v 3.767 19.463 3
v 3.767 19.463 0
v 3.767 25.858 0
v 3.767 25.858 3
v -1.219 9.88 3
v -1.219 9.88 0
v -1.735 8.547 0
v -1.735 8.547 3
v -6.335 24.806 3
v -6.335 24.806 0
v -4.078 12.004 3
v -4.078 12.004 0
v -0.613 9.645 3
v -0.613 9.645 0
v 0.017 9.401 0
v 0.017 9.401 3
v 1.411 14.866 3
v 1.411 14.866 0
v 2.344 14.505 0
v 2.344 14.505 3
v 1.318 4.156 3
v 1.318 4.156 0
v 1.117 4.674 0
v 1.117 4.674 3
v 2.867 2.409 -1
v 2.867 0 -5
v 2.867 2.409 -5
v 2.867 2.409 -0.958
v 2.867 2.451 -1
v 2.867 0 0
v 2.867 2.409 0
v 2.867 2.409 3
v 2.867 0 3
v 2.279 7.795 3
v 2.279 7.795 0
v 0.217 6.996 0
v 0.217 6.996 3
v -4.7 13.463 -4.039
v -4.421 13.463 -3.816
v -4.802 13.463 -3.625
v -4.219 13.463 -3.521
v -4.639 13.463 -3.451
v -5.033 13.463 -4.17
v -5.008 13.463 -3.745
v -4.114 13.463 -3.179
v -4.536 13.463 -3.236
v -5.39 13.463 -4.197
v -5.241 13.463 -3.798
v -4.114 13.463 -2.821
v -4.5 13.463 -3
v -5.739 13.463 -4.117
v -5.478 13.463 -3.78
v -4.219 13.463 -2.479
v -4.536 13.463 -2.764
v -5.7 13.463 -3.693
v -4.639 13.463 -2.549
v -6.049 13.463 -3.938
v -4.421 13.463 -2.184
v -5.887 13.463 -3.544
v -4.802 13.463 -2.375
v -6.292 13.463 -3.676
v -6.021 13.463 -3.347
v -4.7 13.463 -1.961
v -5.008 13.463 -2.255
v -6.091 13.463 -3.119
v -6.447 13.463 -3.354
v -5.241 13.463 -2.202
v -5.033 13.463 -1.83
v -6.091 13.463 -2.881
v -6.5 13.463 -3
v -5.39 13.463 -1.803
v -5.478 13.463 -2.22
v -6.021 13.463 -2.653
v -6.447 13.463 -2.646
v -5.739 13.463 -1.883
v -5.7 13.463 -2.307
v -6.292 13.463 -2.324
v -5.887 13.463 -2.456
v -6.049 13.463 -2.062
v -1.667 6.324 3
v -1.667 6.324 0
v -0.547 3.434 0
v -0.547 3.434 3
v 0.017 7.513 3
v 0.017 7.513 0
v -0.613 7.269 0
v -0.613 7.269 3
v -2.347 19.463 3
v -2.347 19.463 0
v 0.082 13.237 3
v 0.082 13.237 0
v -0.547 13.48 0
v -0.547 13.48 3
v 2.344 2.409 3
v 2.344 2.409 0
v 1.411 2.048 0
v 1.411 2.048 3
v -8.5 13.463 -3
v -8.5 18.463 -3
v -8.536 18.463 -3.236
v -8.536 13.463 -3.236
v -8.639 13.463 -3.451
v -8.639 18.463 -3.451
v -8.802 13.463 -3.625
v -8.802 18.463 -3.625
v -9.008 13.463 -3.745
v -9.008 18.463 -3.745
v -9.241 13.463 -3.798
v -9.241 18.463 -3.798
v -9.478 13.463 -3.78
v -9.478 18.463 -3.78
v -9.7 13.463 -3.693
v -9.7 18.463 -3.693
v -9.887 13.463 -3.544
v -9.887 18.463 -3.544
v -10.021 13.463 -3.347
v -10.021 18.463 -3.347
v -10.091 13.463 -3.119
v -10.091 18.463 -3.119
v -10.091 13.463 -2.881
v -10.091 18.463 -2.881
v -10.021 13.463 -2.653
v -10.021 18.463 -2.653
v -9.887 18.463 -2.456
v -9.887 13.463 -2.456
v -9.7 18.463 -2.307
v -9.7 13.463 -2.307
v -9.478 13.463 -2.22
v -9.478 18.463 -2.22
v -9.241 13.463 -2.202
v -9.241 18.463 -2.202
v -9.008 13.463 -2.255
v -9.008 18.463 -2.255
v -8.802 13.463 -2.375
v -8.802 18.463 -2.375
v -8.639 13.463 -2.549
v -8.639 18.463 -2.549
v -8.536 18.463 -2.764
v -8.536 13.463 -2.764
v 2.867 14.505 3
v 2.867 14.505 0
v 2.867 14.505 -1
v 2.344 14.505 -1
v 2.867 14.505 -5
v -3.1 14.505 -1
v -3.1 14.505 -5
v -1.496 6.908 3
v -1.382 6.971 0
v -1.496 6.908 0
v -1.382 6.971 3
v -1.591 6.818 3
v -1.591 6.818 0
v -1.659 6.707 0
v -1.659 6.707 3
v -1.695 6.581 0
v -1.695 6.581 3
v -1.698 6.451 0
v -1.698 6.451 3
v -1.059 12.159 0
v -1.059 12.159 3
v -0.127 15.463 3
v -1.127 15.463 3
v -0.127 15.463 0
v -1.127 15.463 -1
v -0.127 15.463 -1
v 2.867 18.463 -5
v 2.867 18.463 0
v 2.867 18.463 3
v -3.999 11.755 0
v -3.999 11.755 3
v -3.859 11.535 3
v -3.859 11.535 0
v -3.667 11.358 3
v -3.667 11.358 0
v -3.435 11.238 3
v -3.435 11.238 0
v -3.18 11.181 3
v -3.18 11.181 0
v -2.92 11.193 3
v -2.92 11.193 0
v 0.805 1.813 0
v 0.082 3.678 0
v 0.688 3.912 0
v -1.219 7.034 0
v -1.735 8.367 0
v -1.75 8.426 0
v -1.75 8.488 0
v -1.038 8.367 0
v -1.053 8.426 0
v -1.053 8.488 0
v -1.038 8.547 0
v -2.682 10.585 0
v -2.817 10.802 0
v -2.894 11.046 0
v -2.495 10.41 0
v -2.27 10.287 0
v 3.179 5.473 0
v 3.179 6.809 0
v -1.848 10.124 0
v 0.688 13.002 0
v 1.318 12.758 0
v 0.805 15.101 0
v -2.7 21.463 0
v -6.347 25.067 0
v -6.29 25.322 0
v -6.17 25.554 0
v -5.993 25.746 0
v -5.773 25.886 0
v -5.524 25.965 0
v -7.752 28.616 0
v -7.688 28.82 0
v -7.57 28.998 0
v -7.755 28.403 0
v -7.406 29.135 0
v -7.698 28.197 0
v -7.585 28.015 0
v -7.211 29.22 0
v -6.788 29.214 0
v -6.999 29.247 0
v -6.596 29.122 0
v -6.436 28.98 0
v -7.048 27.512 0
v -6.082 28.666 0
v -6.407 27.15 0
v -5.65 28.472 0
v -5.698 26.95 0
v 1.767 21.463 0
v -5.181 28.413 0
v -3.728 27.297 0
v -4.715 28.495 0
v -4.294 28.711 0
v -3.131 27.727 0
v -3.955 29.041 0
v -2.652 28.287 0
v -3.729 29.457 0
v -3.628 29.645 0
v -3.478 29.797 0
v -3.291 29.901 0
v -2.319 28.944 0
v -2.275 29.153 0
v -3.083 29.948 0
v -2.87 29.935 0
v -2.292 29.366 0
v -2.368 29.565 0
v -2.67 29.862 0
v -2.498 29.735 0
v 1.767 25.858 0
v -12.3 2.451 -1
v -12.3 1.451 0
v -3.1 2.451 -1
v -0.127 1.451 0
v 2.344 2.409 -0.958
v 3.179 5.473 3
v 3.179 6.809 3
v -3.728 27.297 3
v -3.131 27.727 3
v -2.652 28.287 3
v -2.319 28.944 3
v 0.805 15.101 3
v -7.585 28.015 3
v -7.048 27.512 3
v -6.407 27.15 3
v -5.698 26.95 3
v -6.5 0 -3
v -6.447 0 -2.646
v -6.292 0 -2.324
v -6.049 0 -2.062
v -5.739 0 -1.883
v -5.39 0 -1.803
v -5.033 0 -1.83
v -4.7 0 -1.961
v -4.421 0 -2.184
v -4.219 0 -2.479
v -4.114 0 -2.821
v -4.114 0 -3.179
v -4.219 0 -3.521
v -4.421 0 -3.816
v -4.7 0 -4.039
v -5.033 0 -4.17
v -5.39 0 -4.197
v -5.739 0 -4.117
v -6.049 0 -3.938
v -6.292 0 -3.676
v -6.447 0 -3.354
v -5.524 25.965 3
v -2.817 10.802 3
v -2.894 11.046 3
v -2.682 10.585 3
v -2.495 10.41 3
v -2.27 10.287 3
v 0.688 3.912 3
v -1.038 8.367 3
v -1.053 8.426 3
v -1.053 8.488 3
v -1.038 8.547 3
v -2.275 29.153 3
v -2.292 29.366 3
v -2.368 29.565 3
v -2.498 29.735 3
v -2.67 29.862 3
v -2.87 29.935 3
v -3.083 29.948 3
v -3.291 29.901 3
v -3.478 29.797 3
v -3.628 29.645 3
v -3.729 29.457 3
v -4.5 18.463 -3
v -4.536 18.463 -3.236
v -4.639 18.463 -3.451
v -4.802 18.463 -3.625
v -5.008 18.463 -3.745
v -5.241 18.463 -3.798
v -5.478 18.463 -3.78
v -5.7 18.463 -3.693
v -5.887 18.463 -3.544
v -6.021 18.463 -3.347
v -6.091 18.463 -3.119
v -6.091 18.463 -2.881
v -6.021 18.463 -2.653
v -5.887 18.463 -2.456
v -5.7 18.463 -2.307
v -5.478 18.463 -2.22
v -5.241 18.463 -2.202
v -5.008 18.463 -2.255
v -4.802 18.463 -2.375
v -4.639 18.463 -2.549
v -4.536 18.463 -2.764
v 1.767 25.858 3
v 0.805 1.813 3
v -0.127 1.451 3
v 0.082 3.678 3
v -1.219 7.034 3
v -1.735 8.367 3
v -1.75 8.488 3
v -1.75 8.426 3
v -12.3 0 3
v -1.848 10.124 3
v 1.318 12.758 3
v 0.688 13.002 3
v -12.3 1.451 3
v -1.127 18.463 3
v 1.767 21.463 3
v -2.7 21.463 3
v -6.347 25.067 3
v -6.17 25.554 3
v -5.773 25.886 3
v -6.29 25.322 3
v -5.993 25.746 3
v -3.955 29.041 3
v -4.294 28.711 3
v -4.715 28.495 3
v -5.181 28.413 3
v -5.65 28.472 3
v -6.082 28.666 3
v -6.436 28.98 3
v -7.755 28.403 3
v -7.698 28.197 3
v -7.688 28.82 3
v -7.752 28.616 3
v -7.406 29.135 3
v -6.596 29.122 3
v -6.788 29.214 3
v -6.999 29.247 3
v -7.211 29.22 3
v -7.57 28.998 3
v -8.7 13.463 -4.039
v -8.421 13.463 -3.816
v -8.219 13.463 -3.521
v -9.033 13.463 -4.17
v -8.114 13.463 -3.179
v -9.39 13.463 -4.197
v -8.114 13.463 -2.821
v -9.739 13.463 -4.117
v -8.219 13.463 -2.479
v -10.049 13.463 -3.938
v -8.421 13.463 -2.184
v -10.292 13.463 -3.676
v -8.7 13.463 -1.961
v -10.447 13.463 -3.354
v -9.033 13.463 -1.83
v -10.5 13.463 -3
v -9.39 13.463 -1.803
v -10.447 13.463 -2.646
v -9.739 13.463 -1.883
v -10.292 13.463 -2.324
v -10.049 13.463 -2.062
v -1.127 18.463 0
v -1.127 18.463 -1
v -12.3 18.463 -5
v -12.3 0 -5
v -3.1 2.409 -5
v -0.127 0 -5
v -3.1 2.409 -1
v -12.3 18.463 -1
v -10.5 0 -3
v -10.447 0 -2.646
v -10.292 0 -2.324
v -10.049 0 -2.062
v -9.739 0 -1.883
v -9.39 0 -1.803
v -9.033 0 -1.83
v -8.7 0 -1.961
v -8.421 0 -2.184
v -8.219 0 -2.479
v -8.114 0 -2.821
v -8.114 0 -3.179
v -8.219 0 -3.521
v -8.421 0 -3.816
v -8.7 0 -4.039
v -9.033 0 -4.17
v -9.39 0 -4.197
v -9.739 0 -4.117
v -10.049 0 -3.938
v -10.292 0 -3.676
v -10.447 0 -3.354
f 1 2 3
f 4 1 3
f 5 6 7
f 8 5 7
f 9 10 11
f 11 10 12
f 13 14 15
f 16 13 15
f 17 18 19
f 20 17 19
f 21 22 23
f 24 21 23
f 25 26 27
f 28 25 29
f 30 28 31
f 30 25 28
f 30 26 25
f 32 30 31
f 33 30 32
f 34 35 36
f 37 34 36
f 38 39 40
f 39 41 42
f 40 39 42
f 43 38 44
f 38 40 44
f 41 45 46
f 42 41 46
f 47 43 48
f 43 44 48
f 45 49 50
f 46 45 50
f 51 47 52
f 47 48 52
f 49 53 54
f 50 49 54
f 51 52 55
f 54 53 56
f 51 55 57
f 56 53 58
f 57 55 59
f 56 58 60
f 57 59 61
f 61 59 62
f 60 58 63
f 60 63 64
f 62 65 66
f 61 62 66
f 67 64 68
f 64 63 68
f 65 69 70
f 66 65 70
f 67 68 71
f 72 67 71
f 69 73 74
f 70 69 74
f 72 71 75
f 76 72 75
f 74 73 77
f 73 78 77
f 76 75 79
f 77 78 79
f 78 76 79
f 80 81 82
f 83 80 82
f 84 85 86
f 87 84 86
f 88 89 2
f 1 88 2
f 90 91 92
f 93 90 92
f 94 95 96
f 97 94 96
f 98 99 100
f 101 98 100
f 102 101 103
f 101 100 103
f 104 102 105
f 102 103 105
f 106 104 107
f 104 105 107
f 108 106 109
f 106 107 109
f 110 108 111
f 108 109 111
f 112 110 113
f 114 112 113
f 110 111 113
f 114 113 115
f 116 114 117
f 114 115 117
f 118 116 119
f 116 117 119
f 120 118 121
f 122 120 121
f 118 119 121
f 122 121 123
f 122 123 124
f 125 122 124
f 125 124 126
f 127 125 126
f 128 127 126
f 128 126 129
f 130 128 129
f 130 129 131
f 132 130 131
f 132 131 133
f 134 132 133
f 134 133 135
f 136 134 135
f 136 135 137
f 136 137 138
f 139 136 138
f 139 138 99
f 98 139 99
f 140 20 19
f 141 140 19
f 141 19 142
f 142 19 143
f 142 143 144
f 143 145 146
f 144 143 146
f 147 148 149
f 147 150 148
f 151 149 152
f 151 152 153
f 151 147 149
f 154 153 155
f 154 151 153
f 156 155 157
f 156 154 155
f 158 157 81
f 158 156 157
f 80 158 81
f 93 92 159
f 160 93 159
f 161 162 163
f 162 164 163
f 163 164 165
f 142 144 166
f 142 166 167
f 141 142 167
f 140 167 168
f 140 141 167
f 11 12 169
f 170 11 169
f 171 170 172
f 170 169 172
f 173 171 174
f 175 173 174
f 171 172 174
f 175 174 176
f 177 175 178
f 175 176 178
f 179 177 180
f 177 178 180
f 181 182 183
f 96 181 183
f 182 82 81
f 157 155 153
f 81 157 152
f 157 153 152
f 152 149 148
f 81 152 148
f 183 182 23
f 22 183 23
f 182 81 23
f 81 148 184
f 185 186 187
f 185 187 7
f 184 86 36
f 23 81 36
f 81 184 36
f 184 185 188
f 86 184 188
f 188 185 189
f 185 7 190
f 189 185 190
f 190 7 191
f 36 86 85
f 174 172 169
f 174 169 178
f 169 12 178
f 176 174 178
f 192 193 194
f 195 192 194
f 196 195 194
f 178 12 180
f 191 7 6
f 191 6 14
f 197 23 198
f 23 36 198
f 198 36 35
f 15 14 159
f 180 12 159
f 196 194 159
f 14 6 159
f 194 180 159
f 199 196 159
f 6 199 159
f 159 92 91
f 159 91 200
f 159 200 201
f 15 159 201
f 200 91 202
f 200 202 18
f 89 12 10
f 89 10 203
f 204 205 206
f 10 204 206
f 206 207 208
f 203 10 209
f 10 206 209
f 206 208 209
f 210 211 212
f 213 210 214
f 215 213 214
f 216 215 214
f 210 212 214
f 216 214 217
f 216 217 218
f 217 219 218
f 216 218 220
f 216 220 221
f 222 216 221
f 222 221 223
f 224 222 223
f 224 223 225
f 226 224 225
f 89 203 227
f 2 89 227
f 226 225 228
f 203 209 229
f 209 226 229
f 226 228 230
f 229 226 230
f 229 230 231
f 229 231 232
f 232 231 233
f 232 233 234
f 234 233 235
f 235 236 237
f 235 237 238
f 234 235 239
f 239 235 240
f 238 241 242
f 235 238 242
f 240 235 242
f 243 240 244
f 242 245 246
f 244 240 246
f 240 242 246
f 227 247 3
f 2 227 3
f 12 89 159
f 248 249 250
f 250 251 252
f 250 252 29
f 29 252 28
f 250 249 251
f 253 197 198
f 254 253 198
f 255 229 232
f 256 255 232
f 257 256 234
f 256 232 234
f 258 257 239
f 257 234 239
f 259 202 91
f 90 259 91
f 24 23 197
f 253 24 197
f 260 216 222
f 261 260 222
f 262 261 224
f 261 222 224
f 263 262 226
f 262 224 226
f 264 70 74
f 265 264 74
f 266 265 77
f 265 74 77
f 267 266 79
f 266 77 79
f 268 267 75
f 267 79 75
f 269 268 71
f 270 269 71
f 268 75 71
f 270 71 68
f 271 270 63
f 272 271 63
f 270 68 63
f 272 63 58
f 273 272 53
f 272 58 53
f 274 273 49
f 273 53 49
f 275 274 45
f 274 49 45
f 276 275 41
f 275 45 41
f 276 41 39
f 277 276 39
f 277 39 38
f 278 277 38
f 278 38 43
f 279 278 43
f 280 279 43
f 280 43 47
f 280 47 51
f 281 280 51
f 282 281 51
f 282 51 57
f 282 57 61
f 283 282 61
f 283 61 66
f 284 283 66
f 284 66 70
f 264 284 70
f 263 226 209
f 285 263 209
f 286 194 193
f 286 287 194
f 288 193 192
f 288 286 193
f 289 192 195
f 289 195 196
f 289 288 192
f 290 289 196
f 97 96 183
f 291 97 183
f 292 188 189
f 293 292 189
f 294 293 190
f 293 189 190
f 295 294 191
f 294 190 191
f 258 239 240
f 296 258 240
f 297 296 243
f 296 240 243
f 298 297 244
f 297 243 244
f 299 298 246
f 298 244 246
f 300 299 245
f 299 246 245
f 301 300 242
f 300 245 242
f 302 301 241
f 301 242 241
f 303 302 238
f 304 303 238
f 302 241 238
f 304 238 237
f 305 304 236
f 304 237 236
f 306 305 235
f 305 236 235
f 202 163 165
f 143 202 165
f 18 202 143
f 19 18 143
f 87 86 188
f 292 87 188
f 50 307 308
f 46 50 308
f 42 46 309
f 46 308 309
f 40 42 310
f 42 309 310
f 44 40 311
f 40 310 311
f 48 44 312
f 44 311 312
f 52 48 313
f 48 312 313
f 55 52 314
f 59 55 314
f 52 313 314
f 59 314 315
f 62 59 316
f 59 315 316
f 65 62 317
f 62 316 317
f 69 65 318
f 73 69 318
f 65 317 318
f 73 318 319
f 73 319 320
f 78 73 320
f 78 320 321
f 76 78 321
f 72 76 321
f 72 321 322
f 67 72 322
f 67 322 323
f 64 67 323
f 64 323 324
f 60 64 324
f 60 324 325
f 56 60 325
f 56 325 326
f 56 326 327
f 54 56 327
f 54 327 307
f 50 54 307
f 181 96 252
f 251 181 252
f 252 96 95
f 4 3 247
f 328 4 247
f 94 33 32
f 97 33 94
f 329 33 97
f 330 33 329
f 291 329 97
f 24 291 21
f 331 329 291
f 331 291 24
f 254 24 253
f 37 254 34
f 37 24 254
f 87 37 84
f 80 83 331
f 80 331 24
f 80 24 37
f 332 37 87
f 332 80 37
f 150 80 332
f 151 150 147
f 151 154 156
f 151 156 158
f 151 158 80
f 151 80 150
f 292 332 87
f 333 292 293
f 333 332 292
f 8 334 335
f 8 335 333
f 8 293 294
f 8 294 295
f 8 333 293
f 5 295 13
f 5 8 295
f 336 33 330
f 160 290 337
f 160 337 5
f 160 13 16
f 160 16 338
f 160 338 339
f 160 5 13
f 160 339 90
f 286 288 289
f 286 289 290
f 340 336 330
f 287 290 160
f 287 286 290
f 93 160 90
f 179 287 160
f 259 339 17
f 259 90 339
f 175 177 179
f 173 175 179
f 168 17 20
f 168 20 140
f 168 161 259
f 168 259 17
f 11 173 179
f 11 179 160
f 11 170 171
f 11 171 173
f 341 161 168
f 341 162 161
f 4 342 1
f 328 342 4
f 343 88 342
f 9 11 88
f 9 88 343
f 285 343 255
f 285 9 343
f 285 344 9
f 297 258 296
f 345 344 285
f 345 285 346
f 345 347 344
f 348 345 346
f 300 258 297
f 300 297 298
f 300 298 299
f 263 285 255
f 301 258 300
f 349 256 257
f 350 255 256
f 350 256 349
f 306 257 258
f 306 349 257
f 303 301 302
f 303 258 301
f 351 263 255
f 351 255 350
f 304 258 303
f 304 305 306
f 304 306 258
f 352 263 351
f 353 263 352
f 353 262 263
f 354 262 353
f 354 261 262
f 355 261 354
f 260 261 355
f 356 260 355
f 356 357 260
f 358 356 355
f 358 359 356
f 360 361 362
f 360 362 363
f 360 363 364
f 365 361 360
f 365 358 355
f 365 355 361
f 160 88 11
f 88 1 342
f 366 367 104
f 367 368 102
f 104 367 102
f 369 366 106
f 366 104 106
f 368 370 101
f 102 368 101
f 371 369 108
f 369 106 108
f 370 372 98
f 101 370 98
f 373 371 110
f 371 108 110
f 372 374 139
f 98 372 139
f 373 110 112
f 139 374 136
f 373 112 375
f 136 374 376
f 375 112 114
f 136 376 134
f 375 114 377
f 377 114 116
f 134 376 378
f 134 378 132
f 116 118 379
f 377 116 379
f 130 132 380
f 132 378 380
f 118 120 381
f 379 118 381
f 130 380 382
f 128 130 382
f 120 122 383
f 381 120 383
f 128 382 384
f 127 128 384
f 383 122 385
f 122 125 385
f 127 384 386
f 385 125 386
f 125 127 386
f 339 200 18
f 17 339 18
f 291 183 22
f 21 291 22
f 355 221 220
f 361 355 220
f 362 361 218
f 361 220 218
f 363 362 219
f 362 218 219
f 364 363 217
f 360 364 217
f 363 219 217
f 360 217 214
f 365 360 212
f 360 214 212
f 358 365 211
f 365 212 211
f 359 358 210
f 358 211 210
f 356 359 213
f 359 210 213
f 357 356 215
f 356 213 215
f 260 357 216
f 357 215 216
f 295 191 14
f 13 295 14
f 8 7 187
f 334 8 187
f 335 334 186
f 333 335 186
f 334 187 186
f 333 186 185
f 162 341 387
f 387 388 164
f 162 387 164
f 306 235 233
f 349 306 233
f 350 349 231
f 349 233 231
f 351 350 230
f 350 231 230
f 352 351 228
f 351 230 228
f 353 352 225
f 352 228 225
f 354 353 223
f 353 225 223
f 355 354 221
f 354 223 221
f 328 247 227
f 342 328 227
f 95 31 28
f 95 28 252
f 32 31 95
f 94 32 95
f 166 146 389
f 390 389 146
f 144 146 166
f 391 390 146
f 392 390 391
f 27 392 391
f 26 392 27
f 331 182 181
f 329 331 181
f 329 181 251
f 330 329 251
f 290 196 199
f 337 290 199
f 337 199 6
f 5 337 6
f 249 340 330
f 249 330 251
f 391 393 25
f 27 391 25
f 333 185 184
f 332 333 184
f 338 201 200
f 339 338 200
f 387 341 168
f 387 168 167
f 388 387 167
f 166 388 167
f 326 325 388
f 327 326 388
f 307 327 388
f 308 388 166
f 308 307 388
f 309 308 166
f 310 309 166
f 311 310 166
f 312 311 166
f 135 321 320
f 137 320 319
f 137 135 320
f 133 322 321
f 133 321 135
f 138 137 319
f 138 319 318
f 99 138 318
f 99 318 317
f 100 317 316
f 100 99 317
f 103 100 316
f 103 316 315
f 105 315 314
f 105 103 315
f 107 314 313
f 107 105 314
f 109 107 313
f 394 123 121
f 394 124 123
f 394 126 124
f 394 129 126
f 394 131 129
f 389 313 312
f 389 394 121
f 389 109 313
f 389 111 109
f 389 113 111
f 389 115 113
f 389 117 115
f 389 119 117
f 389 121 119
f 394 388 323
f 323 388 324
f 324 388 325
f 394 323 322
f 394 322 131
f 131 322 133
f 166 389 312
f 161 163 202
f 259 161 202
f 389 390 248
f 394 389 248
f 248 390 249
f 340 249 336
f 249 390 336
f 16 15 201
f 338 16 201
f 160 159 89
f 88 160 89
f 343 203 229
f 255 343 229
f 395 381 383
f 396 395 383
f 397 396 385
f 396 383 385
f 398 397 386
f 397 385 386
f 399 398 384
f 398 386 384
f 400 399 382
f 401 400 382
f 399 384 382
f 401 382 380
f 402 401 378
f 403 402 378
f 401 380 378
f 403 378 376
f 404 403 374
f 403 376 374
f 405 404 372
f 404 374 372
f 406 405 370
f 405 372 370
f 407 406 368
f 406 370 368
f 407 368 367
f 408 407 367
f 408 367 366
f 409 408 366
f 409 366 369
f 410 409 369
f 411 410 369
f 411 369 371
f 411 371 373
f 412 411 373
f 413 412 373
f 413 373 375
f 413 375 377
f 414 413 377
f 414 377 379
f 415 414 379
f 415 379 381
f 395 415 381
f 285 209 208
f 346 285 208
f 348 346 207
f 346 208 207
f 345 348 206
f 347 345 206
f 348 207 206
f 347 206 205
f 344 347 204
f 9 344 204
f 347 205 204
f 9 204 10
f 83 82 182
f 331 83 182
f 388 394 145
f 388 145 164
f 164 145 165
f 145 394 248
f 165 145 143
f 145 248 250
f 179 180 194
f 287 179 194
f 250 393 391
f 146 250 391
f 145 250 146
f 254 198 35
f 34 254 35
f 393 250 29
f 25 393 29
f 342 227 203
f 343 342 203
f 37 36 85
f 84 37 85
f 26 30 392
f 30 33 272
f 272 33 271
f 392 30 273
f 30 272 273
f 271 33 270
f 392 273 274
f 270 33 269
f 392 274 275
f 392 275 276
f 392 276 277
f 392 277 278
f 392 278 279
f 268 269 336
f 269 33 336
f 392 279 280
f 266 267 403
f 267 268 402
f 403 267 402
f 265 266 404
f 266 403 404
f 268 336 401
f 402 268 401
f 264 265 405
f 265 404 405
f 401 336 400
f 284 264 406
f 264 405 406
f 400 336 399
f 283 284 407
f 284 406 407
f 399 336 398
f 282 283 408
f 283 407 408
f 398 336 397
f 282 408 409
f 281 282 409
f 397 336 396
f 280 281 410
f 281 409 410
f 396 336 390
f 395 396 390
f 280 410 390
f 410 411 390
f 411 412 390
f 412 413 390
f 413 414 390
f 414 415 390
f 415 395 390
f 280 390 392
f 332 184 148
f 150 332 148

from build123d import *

# Parameters (mm, degrees)
BOSS_SWITCH_BODY_DEPTH            = 3
SKETCH1_W                         = 2.994375291
SKETCH1_H                         = 2.409101515
SKETCH1_W_2                       = 3.994375291
SKETCH1_H_2                       = 3.957767538
BOSS_FLANGE_WIDTH_DEPTH           = 5
BOSS_FLANGE_HEIGHT_REACH          = 36.354
SKETCH2_W                         = 4
SKETCH2_H                         = 3.957767538
SKETCH2_W_2                       = 8
SKETCH2_H_2                       = 1.451333978
SKETCH17_W                        = 15.1675
SKETCH17_H                        = 4
BOSS_FLANGE_SUPPORT_DEPTH         = 13.053634428
CUT_WALL_GAP_DEPTH                = 1
TAP_DRILL_FOR_M2X0_4_TAP1_D       = 1.6
M2_CLEARANCE_HOLE2_D              = 2.4
M2_CLEARANCE_HOLE2_DEPTH          = 13.462735941
CHAMFER_FLANGE_SUPPORT_3_SIZE     = 1
FILLET1_R                         = 1
FILLET2_R                         = 0.5
SKETCH28_W                        = 5.9675
SKETCH28_H                        = 12.095866891
CUT_PRINT_SUPPORT_CLEARANCE_DEPTH = 33.624103931


with BuildPart() as part:
    # Sketch-SwitchBossUp → Boss-Switch Body (new body)
    with BuildSketch(Plane.XY):
        with BuildLine():
            Line((-5.697895702, 26.949658376), (-5.524247524, 25.964850623))
            ThreePointArc((-5.524247524, 25.964850623), (-6.169751391, 25.553619307), (-6.3354071, 24.806394693))
            Line((-6.3354071, 24.806394693), (-4.07798079, 12.003893904))
            ThreePointArc((-4.07798079, 12.003893904), (-3.666749473, 11.358390037), (-2.919524859, 11.192734328))
            Line((-2.919524859, 11.192734328), (-2.795819507, 10.49116641))
            Line((-2.795819507, 10.49116641), (-1.8481327, 10.123820116))
            Line((-1.8481327, 10.123820116), (-1.21876104, 9.87986046))
            Line((-1.21876104, 9.87986046), (-1.735258621, 8.547390389))
            ThreePointArc((-1.735258621, 8.547390389), (-1.752158006, 8.457034961), (-1.735258621, 8.366679532))
            Line((-1.735258621, 8.366679532), (-1.21876104, 7.034209461))
            Line((-1.21876104, 7.034209461), (-1.8481327, 6.790249805))
            Line((-1.8481327, 6.790249805), (-0.547014535, 3.433600952))
            Line((-0.547014535, 3.433600952), (0.082357125, 3.677560608))
            Line((0.082357125, 3.677560608), (0.805200549, 1.81275569))
            Line((0.805200549, 1.81275569), (-0.12720191, 1.451333978))
            Line((-0.12720191, 1.451333978), (-0.12720191, 0))
            Line((-0.12720191, 0), (2.867173381, 0))
            Line((2.867173381, 0), (2.867173381, 2.409101515))
            Line((2.867173381, 2.409101515), (2.343664607, 2.409101515))
            Line((2.343664607, 2.409101515), (1.411262148, 2.047679803))
            Line((1.411262148, 2.047679803), (0.688418723, 3.912484721))
            Line((0.688418723, 3.912484721), (1.317790383, 4.156444377))
            Line((1.317790383, 4.156444377), (1.117265944, 4.673761056))
            Line((1.117265944, 4.673761056), (3.17940291, 5.473095148))
            Line((3.17940291, 5.473095148), (3.17940291, 6.808547192))
            Line((3.17940291, 6.808547192), (2.279218661, 7.795066081))
            Line((2.279218661, 7.795066081), (0.217196658, 6.995776551))
            Line((0.217196658, 6.995776551), (0.016672219, 7.51309323))
            Line((0.016672219, 7.51309323), (-0.612699441, 7.269133574))
            Line((-0.612699441, 7.269133574), (-1.038134762, 8.366679532))
            ThreePointArc((-1.038134762, 8.366679532), (-1.055034148, 8.457034961), (-1.038134762, 8.547390389))
            Line((-1.038134762, 8.547390389), (-0.612699441, 9.644936347))
            Line((-0.612699441, 9.644936347), (0.016672219, 9.400976691))
            Line((0.016672219, 9.400976691), (1.317790383, 12.757625544))
            Line((1.317790383, 12.757625544), (0.688418723, 13.0015852))
            Line((0.688418723, 13.0015852), (1.411262148, 14.866390118))
            Line((1.411262148, 14.866390118), (2.343664607, 14.504968406))
            Line((2.343664607, 14.504968406), (2.867173381, 14.504968406))
            Line((2.867173381, 14.504968406), (2.867173381, 18.462735944))
            Line((2.867173381, 18.462735944), (-0.111637615, 18.462735944))
            Line((-0.111637615, 18.462735944), (-1.12720191, 18.462735944))
            Line((-1.12720191, 18.462735944), (-1.12720191, 15.462735944))
            Line((-1.12720191, 15.462735944), (-0.12720191, 15.462735944))
            Line((-0.12720191, 15.462735944), (0.805200549, 15.101314231))
            Line((0.805200549, 15.101314231), (0.082357125, 13.236509313))
            Line((0.082357125, 13.236509313), (-0.547014535, 13.480468969))
            Line((-0.547014535, 13.480468969), (-1.059112089, 12.159350171))
            Line((-1.059112089, 12.159350171), (-2.346896051, 19.462735944))
            Line((-2.346896051, 19.462735944), (3.767173381, 19.462735944))
            Line((3.767173381, 19.462735944), (3.767173381, 25.857619356))
            Line((3.767173381, 25.857619356), (1.767173381, 25.857619356))
            Line((1.767173381, 25.857619356), (1.767173381, 21.462735944))
            Line((1.767173381, 21.462735944), (-2.699550012, 21.462735944))
            Line((-2.699550012, 21.462735944), (-3.728280196, 27.296954732))
            ThreePointArc((-3.728280196, 27.296954732), (-2.874356585, 27.992742953), (-2.319025652, 28.944012807))
            ThreePointArc((-2.319025652, 28.944012807), (-2.76728001, 29.905297381), (-3.728564583, 29.457043022))
            ThreePointArc((-3.728564583, 29.457043022), (-4.944660137, 28.436617692), (-6.436422172, 28.97957467))
            ThreePointArc((-6.436422172, 28.97957467), (-7.493046212, 29.072017295), (-7.585488837, 28.015393255))
            ThreePointArc((-7.585488837, 28.015393255), (-6.738295005, 27.311426358), (-5.697895702, 26.949658376))
        make_face()
    extrude(amount=BOSS_SWITCH_BODY_DEPTH)

    # Sketch1 → Boss-Flange Width (add)
    with BuildSketch(Plane(origin=(0, 0, 0), x_dir=(-1, 0, 0), z_dir=(0, 0, -1))):
        with Locations((-1.369985736, 1.204550758)):
            Rectangle(SKETCH1_W, SKETCH1_H)
        with Locations((-0.869985736, 16.483852175)):
            Rectangle(SKETCH1_W_2, SKETCH1_H_2)
    extrude(amount=BOSS_FLANGE_WIDTH_DEPTH)

    # Boss-Flange Height: up to this face of the body (flat: up to its plane)
    boss_flange_height_end = Plane(part.part.faces().sort_by_distance((-0.12720191, 1.077409098, -1.438016547))[0])
    # Sketch2 → Boss-Flange Height (add, up to the picked face)
    with BuildSketch(Plane(origin=(-12.300326619, 0, 0), x_dir=(0, 0, -1), z_dir=(1, 0, 0)), mode=Mode.PRIVATE) as boss_flange_height_sk1:
        with Locations((3, 16.483852175)):
            Rectangle(SKETCH2_W, SKETCH2_H)
    boss_flange_height_tool1 = split(extrude(boss_flange_height_sk1.sketch, amount=BOSS_FLANGE_HEIGHT_REACH, mode=Mode.PRIVATE), bisect_by=boss_flange_height_end, keep=Keep.BOTH, mode=Mode.PRIVATE)
    # Sketch2 → Boss-Flange Height (add, up to the picked face)
    with BuildSketch(Plane(origin=(-12.300326619, 0, 0), x_dir=(0, 0, -1), z_dir=(1, 0, 0)), mode=Mode.PRIVATE) as boss_flange_height_sk2:
        with Locations((1, 0.725666989)):
            Rectangle(SKETCH2_W_2, SKETCH2_H_2)
    boss_flange_height_tool2 = split(extrude(boss_flange_height_sk2.sketch, amount=BOSS_FLANGE_HEIGHT_REACH, mode=Mode.PRIVATE), bisect_by=boss_flange_height_end, keep=Keep.BOTH, mode=Mode.PRIVATE)
    add(boss_flange_height_tool1.solids().sort_by(Axis((-12.300327, 16.483852, -3), (1, 0, 0)))[0])
    add(boss_flange_height_tool2.solids().sort_by(Axis((-12.300327, 0.725667, -1), (1, 0, 0)))[0])

    # Sketch17 → Boss-Flange Support (add)
    with BuildSketch(Plane.XZ.offset(-1.451333978)):
        with Locations((-4.716576619, -3)):
            Rectangle(SKETCH17_W, SKETCH17_H)
    extrude(amount=-BOSS_FLANGE_SUPPORT_DEPTH)

    # Sketch27 → Cut-Wall Gap (cut)
    with BuildSketch(Plane.XY):
        Polygon((-0.12720191, 15.462735944), (2.343664607, 14.504968406), (-1.12720191, 14.504968406), (-1.12720191, 15.462735944), align=None)
        Polygon((2.343664607, 2.409101515), (-0.12720191, 2.409101515), (-0.12720191, 1.451333978), align=None)
    extrude(amount=-CUT_WALL_GAP_DEPTH, mode=Mode.SUBTRACT)

    # Tap Drill for M2x0.4 Tap1 (through all)
    with Locations(Plane(origin=(0, 0, 0), x_dir=(-1, 0, 0), z_dir=(0, -1, 0))):
        with Locations((9.300326619, 3), (5.300326619, 3)):
            Hole(TAP_DRILL_FOR_M2X0_4_TAP1_D / 2)

    # M2 Clearance Hole2
    with Locations(Plane.XZ):
        with Locations((-9.300326619, -3), (-5.300326619, -3)):
            Hole(M2_CLEARANCE_HOLE2_D / 2, depth=M2_CLEARANCE_HOLE2_DEPTH)

    # Chamfer-Flange Support 3
    chamfer_flange_support_3_edges = [part.edges().sort_by_distance(p)[0] for p in [
        (-6.213764264, 1.451333978, -1),
    ]]
    chamfer(chamfer_flange_support_3_edges, length=CHAMFER_FLANGE_SUPPORT_3_SIZE)

    # Fillet1
    fillet1_edges = [part.edges().sort_by_distance(p)[0] for p in [
        (-2.795819507, 10.49116641, 1.5),
    ]]
    fillet(fillet1_edges, radius=FILLET1_R)

    # Fillet2
    fillet2_edges = [part.edges().sort_by_distance(p)[0] for p in [
        (-1.8481327, 6.790249805, 1.5),
    ]]
    fillet(fillet2_edges, radius=FILLET2_R)

    # Sketch28 → Cut-Print Support Clearance (cut, through all)
    with BuildSketch(Plane.XY.offset(-1)):
        with Locations((-0.116576619, 8.457034961)):
            Rectangle(SKETCH28_W, SKETCH28_H)
    extrude(amount=-CUT_PRINT_SUPPORT_CLEARANCE_DEPTH, mode=Mode.SUBTRACT)


solid = part.part
